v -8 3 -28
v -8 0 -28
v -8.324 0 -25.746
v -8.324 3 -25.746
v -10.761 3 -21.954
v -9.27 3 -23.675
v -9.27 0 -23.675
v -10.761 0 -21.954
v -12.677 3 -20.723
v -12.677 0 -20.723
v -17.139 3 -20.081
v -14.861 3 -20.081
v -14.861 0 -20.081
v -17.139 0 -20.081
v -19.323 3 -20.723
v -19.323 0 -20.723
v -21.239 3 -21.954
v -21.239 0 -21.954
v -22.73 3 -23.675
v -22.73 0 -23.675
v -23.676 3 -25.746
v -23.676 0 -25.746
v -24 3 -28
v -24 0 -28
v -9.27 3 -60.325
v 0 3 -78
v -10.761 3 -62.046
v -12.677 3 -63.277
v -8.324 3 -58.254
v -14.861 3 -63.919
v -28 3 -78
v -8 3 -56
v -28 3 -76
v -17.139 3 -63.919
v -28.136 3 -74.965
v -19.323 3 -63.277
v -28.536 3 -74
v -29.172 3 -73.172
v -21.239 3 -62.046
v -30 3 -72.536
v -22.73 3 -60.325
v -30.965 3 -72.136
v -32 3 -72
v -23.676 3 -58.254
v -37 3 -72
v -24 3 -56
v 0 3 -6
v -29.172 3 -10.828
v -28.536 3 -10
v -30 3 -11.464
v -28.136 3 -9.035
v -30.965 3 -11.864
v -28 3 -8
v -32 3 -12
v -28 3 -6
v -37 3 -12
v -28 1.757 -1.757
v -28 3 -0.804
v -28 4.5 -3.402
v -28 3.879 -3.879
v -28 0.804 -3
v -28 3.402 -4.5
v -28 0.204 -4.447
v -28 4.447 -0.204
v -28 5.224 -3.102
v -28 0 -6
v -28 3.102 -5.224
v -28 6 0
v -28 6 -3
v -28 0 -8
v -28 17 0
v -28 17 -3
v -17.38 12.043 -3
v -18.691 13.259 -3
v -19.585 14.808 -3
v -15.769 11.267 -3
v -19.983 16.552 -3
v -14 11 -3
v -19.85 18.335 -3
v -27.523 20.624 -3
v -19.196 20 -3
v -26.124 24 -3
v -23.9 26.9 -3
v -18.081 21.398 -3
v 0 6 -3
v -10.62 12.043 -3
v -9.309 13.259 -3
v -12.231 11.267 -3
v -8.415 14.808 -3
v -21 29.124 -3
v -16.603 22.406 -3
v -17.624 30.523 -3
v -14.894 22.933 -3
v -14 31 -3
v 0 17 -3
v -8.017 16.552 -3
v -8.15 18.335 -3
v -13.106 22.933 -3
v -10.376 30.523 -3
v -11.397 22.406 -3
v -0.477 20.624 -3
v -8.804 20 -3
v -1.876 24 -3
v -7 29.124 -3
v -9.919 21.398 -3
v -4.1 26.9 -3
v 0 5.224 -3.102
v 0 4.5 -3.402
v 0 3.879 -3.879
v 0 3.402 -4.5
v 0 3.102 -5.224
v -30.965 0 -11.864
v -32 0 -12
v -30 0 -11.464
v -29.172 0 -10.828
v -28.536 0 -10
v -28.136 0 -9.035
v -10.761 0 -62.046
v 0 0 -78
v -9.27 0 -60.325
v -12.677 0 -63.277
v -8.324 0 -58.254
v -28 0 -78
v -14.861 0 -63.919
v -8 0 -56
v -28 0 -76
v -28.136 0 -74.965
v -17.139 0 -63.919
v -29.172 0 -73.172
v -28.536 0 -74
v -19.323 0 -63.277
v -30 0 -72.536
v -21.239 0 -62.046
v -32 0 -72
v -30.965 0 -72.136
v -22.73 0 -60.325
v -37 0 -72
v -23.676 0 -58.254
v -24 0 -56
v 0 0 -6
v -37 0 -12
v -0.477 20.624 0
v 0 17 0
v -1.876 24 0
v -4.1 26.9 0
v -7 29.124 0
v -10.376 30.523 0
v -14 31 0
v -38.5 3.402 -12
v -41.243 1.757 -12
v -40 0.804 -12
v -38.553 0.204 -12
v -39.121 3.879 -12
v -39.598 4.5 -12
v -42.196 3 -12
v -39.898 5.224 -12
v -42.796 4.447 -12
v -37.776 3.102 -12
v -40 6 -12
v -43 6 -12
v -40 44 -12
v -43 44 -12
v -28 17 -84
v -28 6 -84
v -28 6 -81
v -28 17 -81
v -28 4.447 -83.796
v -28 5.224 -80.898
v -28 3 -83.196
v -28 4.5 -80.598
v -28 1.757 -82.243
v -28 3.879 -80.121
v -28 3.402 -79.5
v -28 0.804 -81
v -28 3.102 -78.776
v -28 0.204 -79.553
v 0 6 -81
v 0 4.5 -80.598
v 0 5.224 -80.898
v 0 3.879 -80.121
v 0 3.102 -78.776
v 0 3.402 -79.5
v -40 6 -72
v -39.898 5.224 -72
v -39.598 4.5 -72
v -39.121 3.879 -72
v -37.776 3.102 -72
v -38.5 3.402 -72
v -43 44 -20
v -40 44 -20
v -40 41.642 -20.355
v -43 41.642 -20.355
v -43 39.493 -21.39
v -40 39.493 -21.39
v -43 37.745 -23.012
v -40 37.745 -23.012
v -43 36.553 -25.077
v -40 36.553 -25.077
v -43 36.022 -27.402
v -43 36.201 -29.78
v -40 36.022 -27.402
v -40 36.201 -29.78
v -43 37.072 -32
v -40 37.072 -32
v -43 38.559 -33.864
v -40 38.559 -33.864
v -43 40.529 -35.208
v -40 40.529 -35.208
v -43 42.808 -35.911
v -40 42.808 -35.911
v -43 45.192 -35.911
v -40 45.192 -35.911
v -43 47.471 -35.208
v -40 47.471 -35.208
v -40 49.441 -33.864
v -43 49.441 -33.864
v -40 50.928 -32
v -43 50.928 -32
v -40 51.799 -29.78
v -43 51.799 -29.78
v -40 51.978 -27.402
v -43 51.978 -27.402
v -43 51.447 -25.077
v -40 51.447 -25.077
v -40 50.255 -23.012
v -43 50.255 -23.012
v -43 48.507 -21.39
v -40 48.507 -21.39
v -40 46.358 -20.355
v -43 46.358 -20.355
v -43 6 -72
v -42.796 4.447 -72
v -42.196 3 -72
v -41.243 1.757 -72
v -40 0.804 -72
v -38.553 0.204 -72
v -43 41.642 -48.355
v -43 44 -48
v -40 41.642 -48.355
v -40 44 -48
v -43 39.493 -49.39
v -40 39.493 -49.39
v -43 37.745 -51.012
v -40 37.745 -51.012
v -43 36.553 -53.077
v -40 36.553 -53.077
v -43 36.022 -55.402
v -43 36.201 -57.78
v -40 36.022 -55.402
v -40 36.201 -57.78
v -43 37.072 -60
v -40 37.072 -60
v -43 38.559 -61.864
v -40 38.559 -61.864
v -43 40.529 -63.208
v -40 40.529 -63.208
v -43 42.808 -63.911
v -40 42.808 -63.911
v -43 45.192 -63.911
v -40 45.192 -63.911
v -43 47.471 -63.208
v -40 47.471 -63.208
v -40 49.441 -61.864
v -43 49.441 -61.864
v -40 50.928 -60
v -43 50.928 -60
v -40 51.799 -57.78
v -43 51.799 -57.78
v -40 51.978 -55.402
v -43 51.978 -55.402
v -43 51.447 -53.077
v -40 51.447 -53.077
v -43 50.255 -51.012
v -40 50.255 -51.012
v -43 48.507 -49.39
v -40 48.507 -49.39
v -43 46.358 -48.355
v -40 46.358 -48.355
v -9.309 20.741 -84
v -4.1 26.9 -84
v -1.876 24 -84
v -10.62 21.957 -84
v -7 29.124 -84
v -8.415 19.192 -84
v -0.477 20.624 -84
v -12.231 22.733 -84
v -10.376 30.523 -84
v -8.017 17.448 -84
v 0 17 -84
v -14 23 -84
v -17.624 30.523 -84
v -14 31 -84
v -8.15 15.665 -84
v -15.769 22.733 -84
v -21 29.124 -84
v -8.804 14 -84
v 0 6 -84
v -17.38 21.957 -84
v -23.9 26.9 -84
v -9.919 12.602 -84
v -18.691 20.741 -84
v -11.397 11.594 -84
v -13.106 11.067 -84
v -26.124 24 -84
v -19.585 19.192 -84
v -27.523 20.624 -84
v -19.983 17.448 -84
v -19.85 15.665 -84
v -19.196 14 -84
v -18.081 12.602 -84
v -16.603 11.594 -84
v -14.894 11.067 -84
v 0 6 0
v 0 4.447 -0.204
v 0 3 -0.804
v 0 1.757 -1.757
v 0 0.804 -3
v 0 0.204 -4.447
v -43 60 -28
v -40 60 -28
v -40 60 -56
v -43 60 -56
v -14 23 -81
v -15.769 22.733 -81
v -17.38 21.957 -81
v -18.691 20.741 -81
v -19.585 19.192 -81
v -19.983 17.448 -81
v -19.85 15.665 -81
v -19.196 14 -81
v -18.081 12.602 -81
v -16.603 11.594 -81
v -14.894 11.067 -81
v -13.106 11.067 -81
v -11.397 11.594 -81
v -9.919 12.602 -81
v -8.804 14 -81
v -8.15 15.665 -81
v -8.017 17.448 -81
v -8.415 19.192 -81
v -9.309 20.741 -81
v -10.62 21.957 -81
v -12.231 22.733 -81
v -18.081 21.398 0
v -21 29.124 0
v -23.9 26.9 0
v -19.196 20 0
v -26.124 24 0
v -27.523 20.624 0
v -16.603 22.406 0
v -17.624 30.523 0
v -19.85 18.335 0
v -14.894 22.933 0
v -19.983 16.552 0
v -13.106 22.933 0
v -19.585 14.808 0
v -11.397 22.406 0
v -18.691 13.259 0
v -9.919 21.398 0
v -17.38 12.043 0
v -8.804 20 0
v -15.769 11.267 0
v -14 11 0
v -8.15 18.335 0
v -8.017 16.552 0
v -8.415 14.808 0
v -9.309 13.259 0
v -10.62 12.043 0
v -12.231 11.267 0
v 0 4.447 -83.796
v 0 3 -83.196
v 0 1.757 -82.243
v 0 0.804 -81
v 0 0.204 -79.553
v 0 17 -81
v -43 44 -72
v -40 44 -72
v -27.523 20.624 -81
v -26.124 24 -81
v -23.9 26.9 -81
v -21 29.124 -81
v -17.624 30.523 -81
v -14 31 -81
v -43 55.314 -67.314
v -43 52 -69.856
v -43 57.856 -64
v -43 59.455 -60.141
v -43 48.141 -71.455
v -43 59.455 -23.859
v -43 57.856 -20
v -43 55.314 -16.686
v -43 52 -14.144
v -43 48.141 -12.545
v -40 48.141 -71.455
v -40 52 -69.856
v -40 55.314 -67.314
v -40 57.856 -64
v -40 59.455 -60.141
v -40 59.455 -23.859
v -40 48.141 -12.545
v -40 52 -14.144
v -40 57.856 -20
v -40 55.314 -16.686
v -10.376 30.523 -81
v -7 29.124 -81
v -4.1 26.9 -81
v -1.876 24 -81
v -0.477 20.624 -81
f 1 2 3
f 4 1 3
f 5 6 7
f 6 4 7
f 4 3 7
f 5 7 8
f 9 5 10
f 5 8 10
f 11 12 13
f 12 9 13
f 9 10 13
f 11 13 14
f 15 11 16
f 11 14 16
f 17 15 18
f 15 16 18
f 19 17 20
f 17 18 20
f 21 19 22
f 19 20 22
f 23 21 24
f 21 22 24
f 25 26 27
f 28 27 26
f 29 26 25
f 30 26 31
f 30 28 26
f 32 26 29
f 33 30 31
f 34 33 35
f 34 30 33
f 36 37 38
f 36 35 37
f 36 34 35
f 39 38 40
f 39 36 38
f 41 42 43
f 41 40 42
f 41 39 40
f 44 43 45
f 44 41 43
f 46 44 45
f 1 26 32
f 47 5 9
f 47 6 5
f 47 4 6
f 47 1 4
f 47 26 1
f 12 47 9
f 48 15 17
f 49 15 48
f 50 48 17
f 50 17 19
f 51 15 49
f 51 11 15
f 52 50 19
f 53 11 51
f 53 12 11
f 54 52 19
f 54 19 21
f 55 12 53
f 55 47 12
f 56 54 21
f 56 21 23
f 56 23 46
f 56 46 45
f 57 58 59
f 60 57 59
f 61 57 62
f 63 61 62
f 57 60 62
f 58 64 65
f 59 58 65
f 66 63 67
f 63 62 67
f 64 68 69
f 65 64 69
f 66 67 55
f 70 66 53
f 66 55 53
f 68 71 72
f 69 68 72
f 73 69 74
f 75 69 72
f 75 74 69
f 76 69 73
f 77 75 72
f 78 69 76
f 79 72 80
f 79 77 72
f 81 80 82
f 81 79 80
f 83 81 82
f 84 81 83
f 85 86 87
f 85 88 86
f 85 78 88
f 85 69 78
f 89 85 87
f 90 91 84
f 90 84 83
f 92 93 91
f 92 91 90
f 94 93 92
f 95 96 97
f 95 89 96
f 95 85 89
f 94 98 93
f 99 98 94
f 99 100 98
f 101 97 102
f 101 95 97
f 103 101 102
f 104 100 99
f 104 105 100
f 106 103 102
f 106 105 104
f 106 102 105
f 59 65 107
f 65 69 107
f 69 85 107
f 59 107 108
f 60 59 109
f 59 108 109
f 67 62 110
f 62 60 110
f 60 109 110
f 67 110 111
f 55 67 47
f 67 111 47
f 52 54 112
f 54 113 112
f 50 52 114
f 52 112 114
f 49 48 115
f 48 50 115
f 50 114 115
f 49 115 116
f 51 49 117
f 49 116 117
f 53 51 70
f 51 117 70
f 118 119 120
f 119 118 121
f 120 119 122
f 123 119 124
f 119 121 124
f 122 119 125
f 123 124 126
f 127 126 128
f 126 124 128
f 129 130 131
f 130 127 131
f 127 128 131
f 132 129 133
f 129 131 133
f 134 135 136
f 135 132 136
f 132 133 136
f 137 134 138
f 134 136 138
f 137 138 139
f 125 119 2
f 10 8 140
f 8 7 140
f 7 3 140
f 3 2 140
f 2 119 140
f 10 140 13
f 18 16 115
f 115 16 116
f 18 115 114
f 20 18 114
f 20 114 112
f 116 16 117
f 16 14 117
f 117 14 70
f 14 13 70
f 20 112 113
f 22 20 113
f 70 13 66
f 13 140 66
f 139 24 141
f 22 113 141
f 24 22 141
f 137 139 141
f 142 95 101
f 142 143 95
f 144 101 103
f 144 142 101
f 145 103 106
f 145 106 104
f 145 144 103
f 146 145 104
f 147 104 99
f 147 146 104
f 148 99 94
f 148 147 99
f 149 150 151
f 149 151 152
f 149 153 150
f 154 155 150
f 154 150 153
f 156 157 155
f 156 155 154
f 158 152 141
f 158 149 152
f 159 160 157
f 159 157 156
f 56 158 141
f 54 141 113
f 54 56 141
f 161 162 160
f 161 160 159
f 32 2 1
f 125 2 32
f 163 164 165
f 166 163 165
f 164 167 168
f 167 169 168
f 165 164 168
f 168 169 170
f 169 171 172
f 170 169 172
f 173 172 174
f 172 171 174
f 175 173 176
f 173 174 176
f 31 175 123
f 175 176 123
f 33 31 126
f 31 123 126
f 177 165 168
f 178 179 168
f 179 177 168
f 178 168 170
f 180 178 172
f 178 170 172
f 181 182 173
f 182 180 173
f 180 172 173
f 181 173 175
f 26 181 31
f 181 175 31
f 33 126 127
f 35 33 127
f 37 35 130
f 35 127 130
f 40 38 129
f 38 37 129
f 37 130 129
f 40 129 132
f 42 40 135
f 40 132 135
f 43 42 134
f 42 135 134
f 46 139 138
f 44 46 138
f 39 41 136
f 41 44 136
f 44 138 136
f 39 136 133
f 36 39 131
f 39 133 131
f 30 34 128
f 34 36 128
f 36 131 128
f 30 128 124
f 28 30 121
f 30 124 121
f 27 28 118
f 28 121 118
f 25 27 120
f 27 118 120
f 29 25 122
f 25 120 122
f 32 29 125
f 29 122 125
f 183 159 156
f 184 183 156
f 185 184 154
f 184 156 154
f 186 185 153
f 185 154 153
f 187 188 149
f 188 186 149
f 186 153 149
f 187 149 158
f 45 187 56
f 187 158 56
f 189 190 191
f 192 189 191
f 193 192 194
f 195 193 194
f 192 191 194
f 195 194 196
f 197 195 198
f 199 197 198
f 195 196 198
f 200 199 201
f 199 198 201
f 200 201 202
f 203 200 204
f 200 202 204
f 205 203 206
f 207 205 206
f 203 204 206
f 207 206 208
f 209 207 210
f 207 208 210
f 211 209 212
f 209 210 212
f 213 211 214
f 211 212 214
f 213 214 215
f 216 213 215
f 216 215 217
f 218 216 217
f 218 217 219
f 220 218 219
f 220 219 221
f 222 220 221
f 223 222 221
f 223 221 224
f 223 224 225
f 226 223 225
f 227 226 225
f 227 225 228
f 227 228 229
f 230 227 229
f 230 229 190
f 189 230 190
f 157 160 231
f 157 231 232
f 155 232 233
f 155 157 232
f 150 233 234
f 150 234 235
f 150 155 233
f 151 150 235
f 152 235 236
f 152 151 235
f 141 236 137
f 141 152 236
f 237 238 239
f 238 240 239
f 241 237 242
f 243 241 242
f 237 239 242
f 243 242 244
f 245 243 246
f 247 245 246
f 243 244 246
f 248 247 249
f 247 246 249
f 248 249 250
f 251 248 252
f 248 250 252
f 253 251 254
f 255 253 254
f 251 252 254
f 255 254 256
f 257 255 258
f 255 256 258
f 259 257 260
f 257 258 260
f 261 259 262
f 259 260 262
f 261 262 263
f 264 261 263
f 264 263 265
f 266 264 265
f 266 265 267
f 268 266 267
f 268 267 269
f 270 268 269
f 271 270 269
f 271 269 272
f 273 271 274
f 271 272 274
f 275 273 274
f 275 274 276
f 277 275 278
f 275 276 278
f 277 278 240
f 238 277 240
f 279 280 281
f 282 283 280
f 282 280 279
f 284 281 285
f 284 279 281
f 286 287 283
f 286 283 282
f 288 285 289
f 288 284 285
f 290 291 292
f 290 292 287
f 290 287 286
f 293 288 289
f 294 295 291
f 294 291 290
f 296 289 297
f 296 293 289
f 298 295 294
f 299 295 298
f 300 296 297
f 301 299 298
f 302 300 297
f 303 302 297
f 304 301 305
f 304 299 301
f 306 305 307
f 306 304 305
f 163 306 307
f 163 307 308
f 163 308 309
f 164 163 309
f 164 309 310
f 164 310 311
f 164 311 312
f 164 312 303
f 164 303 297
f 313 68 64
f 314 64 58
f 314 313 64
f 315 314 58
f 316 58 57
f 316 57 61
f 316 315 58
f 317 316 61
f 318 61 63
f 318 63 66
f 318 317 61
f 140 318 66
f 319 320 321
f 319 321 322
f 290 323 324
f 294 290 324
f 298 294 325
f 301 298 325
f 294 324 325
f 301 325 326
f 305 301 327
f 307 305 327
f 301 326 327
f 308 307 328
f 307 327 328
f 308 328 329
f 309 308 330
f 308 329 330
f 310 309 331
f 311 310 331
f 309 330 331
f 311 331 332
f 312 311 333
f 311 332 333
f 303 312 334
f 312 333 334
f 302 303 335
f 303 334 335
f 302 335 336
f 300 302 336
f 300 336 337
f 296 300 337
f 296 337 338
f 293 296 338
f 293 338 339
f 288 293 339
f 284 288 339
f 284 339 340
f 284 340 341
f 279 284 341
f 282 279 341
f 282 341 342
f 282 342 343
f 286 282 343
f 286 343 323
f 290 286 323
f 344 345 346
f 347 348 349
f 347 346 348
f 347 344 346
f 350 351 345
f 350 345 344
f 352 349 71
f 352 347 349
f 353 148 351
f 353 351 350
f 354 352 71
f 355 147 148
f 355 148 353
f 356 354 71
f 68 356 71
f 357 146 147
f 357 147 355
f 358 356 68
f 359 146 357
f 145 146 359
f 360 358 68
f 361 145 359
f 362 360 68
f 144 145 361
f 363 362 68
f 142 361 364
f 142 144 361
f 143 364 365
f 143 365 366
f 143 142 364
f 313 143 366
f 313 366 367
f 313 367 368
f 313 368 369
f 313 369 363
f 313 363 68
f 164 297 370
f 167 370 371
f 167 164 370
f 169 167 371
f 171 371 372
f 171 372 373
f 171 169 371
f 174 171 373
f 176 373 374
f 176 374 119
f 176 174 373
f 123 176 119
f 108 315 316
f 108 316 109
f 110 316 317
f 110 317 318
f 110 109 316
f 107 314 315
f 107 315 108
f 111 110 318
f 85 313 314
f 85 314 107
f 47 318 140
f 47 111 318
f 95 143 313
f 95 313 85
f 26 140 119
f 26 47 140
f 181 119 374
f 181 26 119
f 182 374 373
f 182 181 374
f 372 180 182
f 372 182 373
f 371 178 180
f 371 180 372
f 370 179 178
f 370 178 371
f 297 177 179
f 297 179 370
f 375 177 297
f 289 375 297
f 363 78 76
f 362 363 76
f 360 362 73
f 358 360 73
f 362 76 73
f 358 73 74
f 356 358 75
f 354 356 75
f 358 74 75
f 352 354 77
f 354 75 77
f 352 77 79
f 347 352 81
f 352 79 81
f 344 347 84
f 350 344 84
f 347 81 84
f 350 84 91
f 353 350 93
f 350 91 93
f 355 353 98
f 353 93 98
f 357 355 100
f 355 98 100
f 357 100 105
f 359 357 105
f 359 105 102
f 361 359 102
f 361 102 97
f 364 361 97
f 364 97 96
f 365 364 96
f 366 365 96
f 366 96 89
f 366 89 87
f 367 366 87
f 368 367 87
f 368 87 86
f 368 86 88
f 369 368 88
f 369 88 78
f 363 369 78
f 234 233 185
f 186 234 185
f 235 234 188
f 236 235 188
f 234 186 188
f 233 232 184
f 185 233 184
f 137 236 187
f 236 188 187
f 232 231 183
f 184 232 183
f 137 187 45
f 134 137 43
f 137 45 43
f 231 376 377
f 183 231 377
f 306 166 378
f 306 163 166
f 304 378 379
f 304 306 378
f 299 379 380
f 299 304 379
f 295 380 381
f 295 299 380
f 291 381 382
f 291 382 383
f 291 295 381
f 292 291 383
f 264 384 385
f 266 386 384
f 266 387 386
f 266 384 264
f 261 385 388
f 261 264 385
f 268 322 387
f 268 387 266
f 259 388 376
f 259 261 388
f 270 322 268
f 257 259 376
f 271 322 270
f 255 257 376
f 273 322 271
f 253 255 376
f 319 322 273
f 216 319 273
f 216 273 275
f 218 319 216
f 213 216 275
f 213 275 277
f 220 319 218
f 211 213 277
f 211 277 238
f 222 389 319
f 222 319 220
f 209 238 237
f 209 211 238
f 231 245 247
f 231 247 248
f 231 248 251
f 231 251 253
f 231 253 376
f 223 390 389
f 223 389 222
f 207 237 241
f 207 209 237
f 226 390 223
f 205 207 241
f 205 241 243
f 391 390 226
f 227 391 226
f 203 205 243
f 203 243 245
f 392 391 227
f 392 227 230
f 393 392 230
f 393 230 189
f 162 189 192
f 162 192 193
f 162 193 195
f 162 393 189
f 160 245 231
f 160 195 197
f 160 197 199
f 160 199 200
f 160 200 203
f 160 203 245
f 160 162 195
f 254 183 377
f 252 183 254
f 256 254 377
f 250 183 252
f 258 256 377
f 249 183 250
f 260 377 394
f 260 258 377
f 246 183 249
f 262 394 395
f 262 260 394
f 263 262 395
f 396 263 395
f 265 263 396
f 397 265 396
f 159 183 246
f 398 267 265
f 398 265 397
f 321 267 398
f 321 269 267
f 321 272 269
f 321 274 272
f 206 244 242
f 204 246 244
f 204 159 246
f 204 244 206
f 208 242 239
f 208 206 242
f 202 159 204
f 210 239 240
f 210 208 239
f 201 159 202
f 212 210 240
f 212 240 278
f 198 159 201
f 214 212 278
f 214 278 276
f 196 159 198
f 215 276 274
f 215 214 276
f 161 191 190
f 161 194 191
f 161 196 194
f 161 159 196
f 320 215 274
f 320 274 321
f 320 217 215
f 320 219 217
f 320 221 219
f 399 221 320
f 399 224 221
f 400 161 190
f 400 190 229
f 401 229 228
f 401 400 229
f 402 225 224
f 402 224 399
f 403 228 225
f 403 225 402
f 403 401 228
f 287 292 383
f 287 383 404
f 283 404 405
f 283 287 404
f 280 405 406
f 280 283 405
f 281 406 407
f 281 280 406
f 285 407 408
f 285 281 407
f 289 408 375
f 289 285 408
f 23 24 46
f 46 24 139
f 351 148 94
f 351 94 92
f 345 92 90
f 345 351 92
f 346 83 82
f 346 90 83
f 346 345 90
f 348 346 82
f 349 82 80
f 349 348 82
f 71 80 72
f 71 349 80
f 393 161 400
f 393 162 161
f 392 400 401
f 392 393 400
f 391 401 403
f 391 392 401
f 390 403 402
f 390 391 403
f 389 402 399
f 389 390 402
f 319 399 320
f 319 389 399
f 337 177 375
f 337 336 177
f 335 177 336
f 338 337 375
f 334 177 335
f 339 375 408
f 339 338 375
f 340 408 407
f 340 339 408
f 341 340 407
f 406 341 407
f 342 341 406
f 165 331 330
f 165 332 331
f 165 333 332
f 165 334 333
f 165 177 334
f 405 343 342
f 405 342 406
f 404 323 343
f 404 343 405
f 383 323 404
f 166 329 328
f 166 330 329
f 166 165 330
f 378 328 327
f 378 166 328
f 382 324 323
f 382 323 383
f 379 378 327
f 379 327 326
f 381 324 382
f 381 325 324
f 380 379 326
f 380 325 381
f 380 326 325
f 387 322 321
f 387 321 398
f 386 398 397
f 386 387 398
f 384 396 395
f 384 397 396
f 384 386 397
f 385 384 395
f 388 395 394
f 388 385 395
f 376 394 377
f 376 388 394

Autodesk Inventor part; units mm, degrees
ref_plane "YZ Plane" through (0, 0, 0) normal (1, 0, 0) x (0, 1, 0)
ref_plane "XZ Plane" through (0, 0, 0) normal (0, 1, 0) x (-1, 0, 0)
ref_plane "XY Plane" through (0, 0, 0) normal (0, 0, 1) x (1, 0, 0)
sketch "Náčrt1" plane through (0, 0, 0) normal (0, 1, 0) x (-1, 0, 0)
  line L0 (0, 0) -> (28, 0)
  line L1 (43, -12) -> (43, -72)
  line L2 (28, -84) -> (0, -84)
  line L3 (0, -84) -> (0, 0)
  line L4 (43, -12) -> (32, -12)
  line L5 (28, -8) -> (28, 0)
  line L6 (28, -84) -> (28, -76)
  line L7 (32, -72) -> (43, -72)
  arc A0 (24, -28) -> (8, -28) centre (16, -28) ccw
  arc A1 (8, -56) -> (24, -56) centre (16, -56) ccw
  line L8 (24, -28) -> (24, -56)
  line L9 (8, -28) -> (8, -56)
  arc A2 (28, -8) -> (32, -12) centre (32, -8) ccw
  arc A3 (32, -72) -> (28, -76) centre (32, -76) ccw
  point P0 (28, -12)
  point P1 (28, -72)
  dimension "d3" = 15
  dimension "d4" = 12
  dimension "d5" = 84
  dimension "d6" = 43
  dimension "d7" = 60
  dimension "d10" = 16
  dimension "d11" = 16
  dimension "d12" = 28
  dimension "d13" = 16
  dimension "d15" = 4
extrude "Deska1" add sketch "Náčrt1" along normal blind 3
sketch "Náčrt2" plane through (0, 0, -3) normal (0, 0, 1) x (1, 0, 0)
  line L0 (-28, 0) -> (0, 0)
  line L1 (0, 0) -> (0, 31)
  line L2 (0, 31) -> (-28, 31)
  line L3 (-28, 31) -> (-28, 0)
edge flange "Obruba1" height 31 angle 90 thickness 3 bend radius 3 thickness toward (0, 0, 1) relief tear relief width 3 relief depth 1.5 corner gap 3 corner form 0 edges at (-14, 3, 0) (-14, 3, -84) wall of the first edge with corners at (-28, 0, -3) (0, 0, -3) (0, 31, -3) (-28, 31, -3)
bend "Ohyb1"
corner "Roh1"
fillet "Zaoblení rohu1" radius 14 4 edges at (-28, 31, -1.5) (0, 31, -1.5) (-28, 31, -82.5) (0, 31, -82.5)
sketch "Náčrt3" plane through (0, 6, -84) normal (0, 0, -1) x (-1, 0, 0)
  line L0 (28, -6) -> (0, -6) projected
  line L1 (28, 11) -> (28, 0) projected
  point P0 (14, 11)
  dimension "d27" = 17
  dimension "d28" = 14
hole "Díra1" at (-14, 17, -84) direction (0, 0, 1) diameter 12 depth 3 tip angle 118
sketch "Náčrt4" plane through (-28, 6, 0) normal (0, 0, 1) x (1, 0, 0)
  line L0 (28, -6) -> (0, -6) projected
  line L1 (28, 11) -> (28, 0) projected
  point P0 (14, 11)
  dimension "d36" = 17
  dimension "d37" = 14
hole "Díra2" at (-14, 17, 0) direction (0, 0, -1) diameter 12 depth 3 tip angle 118
sketch "Náčrt5" plane through (-40, 0, -12) normal (-1, 0, 0) x (0, -1, 0)
  line L0 (0, -60) -> (0, 0)
  line L1 (0, 0) -> (-60, 0)
  line L2 (-60, 0) -> (-60, -60)
  line L3 (-60, -60) -> (0, -60)
edge flange "Obruba2" height 60 angle 90 thickness 3 bend radius 3 thickness toward (-1, 0, 0) relief tear relief width 3 relief depth 1.5 edges at (-43, 3, -42) wall of the first edge with corners at (-40, 0, -72) (-40, 0, -12) (-40, 60, -12) (-40, 60, -72)
bend "Ohyb2"
corner "Roh2"
fillet "Zaoblení rohu2" radius 16 2 edges at (-41.5, 60, -72) (-41.5, 60, -12)
sketch "Náčrt6" plane through (-43, 6, -72) normal (-1, 0, 0) x (0, 0, 1)
  line L0 (60, -6) -> (0, -6) projected
  line L1 (0, 0) -> (0, 38) projected
  point P0 (72, -6)
  point P1 (16, 38)
  dimension "d56" = 44
  dimension "d57" = 16
hole "Díra3" at (-43, 44, -56) direction (1, 0, 0) diameter 16 depth 3 tip angle 118
sketch "Náčrt7" plane through (-43, 6, -72) normal (-1, 0, 0) x (0, 0, 1)
  line L0 (60, -6) -> (0, -6) projected
  line L1 (60, 38) -> (60, 0) projected
  point P0 (72, -6)
  point P1 (44, 38)
  dimension "d65" = 44
  dimension "d66" = 16
hole "Díra4" at (-43, 44, -28) direction (1, 0, 0) diameter 16 depth 3 tip angle 118
equation "\"d34\" = Tloušťka"
equation "\"d43\" = Tloušťka"
equation "\"d63\" = Tloušťka"
equation "\"d72\" = Tloušťka"
equation "\"d14\" = Tloušťka"
equation "\"d16\" = ŠířkaVýštipu"
equation "\"d17\" = HloubkaVýštipu"
equation "\"d18\" = MinimálníZbytek"
equation "\"d19\" = PřechodovýPoloměr"
equation "\"d22\" = PoloměrOhybu"
equation "\"d23\" = VelikostRohovéhoVýštipu"
equation "\"d24\" = VelikostMezery"
equation "\"d25\" = VelikostJacobihoPoloměru"
equation "\"d45\" = ŠířkaVýštipu"
equation "\"d46\" = HloubkaVýštipu"
equation "\"d47\" = MinimálníZbytek"
equation "\"d48\" = PřechodovýPoloměr"
equation "\"d51\" = PoloměrOhybu"
equation "\"d52\" = VelikostRohovéhoVýštipu"
equation "\"d53\" = VelikostMezery"
equation "\"d54\" = VelikostJacobihoPoloměru"
equation "\"PoloměrOhybu\" = Tloušťka"
equation "\"ŠířkaVýštipu\" = Tloušťka"
equation "\"HloubkaVýštipu\" = 0.5 * Tloušťka"
equation "\"VelikostRohovéhoVýštipu\" = 4 * Tloušťka"
equation "\"MinimálníZbytek\" = 2 * Tloušťka"
equation "\"PřechodovýPoloměr\" = PoloměrOhybu"
equation "\"VelikostJacobihoPoloměru\" = PoloměrOhybu"
equation "\"VelikostMezery\" = Tloušťka"
equation "\"Tloušťka\" = 3"
properties part number "26886-Vodička_Vojtěch_příklad-3"
